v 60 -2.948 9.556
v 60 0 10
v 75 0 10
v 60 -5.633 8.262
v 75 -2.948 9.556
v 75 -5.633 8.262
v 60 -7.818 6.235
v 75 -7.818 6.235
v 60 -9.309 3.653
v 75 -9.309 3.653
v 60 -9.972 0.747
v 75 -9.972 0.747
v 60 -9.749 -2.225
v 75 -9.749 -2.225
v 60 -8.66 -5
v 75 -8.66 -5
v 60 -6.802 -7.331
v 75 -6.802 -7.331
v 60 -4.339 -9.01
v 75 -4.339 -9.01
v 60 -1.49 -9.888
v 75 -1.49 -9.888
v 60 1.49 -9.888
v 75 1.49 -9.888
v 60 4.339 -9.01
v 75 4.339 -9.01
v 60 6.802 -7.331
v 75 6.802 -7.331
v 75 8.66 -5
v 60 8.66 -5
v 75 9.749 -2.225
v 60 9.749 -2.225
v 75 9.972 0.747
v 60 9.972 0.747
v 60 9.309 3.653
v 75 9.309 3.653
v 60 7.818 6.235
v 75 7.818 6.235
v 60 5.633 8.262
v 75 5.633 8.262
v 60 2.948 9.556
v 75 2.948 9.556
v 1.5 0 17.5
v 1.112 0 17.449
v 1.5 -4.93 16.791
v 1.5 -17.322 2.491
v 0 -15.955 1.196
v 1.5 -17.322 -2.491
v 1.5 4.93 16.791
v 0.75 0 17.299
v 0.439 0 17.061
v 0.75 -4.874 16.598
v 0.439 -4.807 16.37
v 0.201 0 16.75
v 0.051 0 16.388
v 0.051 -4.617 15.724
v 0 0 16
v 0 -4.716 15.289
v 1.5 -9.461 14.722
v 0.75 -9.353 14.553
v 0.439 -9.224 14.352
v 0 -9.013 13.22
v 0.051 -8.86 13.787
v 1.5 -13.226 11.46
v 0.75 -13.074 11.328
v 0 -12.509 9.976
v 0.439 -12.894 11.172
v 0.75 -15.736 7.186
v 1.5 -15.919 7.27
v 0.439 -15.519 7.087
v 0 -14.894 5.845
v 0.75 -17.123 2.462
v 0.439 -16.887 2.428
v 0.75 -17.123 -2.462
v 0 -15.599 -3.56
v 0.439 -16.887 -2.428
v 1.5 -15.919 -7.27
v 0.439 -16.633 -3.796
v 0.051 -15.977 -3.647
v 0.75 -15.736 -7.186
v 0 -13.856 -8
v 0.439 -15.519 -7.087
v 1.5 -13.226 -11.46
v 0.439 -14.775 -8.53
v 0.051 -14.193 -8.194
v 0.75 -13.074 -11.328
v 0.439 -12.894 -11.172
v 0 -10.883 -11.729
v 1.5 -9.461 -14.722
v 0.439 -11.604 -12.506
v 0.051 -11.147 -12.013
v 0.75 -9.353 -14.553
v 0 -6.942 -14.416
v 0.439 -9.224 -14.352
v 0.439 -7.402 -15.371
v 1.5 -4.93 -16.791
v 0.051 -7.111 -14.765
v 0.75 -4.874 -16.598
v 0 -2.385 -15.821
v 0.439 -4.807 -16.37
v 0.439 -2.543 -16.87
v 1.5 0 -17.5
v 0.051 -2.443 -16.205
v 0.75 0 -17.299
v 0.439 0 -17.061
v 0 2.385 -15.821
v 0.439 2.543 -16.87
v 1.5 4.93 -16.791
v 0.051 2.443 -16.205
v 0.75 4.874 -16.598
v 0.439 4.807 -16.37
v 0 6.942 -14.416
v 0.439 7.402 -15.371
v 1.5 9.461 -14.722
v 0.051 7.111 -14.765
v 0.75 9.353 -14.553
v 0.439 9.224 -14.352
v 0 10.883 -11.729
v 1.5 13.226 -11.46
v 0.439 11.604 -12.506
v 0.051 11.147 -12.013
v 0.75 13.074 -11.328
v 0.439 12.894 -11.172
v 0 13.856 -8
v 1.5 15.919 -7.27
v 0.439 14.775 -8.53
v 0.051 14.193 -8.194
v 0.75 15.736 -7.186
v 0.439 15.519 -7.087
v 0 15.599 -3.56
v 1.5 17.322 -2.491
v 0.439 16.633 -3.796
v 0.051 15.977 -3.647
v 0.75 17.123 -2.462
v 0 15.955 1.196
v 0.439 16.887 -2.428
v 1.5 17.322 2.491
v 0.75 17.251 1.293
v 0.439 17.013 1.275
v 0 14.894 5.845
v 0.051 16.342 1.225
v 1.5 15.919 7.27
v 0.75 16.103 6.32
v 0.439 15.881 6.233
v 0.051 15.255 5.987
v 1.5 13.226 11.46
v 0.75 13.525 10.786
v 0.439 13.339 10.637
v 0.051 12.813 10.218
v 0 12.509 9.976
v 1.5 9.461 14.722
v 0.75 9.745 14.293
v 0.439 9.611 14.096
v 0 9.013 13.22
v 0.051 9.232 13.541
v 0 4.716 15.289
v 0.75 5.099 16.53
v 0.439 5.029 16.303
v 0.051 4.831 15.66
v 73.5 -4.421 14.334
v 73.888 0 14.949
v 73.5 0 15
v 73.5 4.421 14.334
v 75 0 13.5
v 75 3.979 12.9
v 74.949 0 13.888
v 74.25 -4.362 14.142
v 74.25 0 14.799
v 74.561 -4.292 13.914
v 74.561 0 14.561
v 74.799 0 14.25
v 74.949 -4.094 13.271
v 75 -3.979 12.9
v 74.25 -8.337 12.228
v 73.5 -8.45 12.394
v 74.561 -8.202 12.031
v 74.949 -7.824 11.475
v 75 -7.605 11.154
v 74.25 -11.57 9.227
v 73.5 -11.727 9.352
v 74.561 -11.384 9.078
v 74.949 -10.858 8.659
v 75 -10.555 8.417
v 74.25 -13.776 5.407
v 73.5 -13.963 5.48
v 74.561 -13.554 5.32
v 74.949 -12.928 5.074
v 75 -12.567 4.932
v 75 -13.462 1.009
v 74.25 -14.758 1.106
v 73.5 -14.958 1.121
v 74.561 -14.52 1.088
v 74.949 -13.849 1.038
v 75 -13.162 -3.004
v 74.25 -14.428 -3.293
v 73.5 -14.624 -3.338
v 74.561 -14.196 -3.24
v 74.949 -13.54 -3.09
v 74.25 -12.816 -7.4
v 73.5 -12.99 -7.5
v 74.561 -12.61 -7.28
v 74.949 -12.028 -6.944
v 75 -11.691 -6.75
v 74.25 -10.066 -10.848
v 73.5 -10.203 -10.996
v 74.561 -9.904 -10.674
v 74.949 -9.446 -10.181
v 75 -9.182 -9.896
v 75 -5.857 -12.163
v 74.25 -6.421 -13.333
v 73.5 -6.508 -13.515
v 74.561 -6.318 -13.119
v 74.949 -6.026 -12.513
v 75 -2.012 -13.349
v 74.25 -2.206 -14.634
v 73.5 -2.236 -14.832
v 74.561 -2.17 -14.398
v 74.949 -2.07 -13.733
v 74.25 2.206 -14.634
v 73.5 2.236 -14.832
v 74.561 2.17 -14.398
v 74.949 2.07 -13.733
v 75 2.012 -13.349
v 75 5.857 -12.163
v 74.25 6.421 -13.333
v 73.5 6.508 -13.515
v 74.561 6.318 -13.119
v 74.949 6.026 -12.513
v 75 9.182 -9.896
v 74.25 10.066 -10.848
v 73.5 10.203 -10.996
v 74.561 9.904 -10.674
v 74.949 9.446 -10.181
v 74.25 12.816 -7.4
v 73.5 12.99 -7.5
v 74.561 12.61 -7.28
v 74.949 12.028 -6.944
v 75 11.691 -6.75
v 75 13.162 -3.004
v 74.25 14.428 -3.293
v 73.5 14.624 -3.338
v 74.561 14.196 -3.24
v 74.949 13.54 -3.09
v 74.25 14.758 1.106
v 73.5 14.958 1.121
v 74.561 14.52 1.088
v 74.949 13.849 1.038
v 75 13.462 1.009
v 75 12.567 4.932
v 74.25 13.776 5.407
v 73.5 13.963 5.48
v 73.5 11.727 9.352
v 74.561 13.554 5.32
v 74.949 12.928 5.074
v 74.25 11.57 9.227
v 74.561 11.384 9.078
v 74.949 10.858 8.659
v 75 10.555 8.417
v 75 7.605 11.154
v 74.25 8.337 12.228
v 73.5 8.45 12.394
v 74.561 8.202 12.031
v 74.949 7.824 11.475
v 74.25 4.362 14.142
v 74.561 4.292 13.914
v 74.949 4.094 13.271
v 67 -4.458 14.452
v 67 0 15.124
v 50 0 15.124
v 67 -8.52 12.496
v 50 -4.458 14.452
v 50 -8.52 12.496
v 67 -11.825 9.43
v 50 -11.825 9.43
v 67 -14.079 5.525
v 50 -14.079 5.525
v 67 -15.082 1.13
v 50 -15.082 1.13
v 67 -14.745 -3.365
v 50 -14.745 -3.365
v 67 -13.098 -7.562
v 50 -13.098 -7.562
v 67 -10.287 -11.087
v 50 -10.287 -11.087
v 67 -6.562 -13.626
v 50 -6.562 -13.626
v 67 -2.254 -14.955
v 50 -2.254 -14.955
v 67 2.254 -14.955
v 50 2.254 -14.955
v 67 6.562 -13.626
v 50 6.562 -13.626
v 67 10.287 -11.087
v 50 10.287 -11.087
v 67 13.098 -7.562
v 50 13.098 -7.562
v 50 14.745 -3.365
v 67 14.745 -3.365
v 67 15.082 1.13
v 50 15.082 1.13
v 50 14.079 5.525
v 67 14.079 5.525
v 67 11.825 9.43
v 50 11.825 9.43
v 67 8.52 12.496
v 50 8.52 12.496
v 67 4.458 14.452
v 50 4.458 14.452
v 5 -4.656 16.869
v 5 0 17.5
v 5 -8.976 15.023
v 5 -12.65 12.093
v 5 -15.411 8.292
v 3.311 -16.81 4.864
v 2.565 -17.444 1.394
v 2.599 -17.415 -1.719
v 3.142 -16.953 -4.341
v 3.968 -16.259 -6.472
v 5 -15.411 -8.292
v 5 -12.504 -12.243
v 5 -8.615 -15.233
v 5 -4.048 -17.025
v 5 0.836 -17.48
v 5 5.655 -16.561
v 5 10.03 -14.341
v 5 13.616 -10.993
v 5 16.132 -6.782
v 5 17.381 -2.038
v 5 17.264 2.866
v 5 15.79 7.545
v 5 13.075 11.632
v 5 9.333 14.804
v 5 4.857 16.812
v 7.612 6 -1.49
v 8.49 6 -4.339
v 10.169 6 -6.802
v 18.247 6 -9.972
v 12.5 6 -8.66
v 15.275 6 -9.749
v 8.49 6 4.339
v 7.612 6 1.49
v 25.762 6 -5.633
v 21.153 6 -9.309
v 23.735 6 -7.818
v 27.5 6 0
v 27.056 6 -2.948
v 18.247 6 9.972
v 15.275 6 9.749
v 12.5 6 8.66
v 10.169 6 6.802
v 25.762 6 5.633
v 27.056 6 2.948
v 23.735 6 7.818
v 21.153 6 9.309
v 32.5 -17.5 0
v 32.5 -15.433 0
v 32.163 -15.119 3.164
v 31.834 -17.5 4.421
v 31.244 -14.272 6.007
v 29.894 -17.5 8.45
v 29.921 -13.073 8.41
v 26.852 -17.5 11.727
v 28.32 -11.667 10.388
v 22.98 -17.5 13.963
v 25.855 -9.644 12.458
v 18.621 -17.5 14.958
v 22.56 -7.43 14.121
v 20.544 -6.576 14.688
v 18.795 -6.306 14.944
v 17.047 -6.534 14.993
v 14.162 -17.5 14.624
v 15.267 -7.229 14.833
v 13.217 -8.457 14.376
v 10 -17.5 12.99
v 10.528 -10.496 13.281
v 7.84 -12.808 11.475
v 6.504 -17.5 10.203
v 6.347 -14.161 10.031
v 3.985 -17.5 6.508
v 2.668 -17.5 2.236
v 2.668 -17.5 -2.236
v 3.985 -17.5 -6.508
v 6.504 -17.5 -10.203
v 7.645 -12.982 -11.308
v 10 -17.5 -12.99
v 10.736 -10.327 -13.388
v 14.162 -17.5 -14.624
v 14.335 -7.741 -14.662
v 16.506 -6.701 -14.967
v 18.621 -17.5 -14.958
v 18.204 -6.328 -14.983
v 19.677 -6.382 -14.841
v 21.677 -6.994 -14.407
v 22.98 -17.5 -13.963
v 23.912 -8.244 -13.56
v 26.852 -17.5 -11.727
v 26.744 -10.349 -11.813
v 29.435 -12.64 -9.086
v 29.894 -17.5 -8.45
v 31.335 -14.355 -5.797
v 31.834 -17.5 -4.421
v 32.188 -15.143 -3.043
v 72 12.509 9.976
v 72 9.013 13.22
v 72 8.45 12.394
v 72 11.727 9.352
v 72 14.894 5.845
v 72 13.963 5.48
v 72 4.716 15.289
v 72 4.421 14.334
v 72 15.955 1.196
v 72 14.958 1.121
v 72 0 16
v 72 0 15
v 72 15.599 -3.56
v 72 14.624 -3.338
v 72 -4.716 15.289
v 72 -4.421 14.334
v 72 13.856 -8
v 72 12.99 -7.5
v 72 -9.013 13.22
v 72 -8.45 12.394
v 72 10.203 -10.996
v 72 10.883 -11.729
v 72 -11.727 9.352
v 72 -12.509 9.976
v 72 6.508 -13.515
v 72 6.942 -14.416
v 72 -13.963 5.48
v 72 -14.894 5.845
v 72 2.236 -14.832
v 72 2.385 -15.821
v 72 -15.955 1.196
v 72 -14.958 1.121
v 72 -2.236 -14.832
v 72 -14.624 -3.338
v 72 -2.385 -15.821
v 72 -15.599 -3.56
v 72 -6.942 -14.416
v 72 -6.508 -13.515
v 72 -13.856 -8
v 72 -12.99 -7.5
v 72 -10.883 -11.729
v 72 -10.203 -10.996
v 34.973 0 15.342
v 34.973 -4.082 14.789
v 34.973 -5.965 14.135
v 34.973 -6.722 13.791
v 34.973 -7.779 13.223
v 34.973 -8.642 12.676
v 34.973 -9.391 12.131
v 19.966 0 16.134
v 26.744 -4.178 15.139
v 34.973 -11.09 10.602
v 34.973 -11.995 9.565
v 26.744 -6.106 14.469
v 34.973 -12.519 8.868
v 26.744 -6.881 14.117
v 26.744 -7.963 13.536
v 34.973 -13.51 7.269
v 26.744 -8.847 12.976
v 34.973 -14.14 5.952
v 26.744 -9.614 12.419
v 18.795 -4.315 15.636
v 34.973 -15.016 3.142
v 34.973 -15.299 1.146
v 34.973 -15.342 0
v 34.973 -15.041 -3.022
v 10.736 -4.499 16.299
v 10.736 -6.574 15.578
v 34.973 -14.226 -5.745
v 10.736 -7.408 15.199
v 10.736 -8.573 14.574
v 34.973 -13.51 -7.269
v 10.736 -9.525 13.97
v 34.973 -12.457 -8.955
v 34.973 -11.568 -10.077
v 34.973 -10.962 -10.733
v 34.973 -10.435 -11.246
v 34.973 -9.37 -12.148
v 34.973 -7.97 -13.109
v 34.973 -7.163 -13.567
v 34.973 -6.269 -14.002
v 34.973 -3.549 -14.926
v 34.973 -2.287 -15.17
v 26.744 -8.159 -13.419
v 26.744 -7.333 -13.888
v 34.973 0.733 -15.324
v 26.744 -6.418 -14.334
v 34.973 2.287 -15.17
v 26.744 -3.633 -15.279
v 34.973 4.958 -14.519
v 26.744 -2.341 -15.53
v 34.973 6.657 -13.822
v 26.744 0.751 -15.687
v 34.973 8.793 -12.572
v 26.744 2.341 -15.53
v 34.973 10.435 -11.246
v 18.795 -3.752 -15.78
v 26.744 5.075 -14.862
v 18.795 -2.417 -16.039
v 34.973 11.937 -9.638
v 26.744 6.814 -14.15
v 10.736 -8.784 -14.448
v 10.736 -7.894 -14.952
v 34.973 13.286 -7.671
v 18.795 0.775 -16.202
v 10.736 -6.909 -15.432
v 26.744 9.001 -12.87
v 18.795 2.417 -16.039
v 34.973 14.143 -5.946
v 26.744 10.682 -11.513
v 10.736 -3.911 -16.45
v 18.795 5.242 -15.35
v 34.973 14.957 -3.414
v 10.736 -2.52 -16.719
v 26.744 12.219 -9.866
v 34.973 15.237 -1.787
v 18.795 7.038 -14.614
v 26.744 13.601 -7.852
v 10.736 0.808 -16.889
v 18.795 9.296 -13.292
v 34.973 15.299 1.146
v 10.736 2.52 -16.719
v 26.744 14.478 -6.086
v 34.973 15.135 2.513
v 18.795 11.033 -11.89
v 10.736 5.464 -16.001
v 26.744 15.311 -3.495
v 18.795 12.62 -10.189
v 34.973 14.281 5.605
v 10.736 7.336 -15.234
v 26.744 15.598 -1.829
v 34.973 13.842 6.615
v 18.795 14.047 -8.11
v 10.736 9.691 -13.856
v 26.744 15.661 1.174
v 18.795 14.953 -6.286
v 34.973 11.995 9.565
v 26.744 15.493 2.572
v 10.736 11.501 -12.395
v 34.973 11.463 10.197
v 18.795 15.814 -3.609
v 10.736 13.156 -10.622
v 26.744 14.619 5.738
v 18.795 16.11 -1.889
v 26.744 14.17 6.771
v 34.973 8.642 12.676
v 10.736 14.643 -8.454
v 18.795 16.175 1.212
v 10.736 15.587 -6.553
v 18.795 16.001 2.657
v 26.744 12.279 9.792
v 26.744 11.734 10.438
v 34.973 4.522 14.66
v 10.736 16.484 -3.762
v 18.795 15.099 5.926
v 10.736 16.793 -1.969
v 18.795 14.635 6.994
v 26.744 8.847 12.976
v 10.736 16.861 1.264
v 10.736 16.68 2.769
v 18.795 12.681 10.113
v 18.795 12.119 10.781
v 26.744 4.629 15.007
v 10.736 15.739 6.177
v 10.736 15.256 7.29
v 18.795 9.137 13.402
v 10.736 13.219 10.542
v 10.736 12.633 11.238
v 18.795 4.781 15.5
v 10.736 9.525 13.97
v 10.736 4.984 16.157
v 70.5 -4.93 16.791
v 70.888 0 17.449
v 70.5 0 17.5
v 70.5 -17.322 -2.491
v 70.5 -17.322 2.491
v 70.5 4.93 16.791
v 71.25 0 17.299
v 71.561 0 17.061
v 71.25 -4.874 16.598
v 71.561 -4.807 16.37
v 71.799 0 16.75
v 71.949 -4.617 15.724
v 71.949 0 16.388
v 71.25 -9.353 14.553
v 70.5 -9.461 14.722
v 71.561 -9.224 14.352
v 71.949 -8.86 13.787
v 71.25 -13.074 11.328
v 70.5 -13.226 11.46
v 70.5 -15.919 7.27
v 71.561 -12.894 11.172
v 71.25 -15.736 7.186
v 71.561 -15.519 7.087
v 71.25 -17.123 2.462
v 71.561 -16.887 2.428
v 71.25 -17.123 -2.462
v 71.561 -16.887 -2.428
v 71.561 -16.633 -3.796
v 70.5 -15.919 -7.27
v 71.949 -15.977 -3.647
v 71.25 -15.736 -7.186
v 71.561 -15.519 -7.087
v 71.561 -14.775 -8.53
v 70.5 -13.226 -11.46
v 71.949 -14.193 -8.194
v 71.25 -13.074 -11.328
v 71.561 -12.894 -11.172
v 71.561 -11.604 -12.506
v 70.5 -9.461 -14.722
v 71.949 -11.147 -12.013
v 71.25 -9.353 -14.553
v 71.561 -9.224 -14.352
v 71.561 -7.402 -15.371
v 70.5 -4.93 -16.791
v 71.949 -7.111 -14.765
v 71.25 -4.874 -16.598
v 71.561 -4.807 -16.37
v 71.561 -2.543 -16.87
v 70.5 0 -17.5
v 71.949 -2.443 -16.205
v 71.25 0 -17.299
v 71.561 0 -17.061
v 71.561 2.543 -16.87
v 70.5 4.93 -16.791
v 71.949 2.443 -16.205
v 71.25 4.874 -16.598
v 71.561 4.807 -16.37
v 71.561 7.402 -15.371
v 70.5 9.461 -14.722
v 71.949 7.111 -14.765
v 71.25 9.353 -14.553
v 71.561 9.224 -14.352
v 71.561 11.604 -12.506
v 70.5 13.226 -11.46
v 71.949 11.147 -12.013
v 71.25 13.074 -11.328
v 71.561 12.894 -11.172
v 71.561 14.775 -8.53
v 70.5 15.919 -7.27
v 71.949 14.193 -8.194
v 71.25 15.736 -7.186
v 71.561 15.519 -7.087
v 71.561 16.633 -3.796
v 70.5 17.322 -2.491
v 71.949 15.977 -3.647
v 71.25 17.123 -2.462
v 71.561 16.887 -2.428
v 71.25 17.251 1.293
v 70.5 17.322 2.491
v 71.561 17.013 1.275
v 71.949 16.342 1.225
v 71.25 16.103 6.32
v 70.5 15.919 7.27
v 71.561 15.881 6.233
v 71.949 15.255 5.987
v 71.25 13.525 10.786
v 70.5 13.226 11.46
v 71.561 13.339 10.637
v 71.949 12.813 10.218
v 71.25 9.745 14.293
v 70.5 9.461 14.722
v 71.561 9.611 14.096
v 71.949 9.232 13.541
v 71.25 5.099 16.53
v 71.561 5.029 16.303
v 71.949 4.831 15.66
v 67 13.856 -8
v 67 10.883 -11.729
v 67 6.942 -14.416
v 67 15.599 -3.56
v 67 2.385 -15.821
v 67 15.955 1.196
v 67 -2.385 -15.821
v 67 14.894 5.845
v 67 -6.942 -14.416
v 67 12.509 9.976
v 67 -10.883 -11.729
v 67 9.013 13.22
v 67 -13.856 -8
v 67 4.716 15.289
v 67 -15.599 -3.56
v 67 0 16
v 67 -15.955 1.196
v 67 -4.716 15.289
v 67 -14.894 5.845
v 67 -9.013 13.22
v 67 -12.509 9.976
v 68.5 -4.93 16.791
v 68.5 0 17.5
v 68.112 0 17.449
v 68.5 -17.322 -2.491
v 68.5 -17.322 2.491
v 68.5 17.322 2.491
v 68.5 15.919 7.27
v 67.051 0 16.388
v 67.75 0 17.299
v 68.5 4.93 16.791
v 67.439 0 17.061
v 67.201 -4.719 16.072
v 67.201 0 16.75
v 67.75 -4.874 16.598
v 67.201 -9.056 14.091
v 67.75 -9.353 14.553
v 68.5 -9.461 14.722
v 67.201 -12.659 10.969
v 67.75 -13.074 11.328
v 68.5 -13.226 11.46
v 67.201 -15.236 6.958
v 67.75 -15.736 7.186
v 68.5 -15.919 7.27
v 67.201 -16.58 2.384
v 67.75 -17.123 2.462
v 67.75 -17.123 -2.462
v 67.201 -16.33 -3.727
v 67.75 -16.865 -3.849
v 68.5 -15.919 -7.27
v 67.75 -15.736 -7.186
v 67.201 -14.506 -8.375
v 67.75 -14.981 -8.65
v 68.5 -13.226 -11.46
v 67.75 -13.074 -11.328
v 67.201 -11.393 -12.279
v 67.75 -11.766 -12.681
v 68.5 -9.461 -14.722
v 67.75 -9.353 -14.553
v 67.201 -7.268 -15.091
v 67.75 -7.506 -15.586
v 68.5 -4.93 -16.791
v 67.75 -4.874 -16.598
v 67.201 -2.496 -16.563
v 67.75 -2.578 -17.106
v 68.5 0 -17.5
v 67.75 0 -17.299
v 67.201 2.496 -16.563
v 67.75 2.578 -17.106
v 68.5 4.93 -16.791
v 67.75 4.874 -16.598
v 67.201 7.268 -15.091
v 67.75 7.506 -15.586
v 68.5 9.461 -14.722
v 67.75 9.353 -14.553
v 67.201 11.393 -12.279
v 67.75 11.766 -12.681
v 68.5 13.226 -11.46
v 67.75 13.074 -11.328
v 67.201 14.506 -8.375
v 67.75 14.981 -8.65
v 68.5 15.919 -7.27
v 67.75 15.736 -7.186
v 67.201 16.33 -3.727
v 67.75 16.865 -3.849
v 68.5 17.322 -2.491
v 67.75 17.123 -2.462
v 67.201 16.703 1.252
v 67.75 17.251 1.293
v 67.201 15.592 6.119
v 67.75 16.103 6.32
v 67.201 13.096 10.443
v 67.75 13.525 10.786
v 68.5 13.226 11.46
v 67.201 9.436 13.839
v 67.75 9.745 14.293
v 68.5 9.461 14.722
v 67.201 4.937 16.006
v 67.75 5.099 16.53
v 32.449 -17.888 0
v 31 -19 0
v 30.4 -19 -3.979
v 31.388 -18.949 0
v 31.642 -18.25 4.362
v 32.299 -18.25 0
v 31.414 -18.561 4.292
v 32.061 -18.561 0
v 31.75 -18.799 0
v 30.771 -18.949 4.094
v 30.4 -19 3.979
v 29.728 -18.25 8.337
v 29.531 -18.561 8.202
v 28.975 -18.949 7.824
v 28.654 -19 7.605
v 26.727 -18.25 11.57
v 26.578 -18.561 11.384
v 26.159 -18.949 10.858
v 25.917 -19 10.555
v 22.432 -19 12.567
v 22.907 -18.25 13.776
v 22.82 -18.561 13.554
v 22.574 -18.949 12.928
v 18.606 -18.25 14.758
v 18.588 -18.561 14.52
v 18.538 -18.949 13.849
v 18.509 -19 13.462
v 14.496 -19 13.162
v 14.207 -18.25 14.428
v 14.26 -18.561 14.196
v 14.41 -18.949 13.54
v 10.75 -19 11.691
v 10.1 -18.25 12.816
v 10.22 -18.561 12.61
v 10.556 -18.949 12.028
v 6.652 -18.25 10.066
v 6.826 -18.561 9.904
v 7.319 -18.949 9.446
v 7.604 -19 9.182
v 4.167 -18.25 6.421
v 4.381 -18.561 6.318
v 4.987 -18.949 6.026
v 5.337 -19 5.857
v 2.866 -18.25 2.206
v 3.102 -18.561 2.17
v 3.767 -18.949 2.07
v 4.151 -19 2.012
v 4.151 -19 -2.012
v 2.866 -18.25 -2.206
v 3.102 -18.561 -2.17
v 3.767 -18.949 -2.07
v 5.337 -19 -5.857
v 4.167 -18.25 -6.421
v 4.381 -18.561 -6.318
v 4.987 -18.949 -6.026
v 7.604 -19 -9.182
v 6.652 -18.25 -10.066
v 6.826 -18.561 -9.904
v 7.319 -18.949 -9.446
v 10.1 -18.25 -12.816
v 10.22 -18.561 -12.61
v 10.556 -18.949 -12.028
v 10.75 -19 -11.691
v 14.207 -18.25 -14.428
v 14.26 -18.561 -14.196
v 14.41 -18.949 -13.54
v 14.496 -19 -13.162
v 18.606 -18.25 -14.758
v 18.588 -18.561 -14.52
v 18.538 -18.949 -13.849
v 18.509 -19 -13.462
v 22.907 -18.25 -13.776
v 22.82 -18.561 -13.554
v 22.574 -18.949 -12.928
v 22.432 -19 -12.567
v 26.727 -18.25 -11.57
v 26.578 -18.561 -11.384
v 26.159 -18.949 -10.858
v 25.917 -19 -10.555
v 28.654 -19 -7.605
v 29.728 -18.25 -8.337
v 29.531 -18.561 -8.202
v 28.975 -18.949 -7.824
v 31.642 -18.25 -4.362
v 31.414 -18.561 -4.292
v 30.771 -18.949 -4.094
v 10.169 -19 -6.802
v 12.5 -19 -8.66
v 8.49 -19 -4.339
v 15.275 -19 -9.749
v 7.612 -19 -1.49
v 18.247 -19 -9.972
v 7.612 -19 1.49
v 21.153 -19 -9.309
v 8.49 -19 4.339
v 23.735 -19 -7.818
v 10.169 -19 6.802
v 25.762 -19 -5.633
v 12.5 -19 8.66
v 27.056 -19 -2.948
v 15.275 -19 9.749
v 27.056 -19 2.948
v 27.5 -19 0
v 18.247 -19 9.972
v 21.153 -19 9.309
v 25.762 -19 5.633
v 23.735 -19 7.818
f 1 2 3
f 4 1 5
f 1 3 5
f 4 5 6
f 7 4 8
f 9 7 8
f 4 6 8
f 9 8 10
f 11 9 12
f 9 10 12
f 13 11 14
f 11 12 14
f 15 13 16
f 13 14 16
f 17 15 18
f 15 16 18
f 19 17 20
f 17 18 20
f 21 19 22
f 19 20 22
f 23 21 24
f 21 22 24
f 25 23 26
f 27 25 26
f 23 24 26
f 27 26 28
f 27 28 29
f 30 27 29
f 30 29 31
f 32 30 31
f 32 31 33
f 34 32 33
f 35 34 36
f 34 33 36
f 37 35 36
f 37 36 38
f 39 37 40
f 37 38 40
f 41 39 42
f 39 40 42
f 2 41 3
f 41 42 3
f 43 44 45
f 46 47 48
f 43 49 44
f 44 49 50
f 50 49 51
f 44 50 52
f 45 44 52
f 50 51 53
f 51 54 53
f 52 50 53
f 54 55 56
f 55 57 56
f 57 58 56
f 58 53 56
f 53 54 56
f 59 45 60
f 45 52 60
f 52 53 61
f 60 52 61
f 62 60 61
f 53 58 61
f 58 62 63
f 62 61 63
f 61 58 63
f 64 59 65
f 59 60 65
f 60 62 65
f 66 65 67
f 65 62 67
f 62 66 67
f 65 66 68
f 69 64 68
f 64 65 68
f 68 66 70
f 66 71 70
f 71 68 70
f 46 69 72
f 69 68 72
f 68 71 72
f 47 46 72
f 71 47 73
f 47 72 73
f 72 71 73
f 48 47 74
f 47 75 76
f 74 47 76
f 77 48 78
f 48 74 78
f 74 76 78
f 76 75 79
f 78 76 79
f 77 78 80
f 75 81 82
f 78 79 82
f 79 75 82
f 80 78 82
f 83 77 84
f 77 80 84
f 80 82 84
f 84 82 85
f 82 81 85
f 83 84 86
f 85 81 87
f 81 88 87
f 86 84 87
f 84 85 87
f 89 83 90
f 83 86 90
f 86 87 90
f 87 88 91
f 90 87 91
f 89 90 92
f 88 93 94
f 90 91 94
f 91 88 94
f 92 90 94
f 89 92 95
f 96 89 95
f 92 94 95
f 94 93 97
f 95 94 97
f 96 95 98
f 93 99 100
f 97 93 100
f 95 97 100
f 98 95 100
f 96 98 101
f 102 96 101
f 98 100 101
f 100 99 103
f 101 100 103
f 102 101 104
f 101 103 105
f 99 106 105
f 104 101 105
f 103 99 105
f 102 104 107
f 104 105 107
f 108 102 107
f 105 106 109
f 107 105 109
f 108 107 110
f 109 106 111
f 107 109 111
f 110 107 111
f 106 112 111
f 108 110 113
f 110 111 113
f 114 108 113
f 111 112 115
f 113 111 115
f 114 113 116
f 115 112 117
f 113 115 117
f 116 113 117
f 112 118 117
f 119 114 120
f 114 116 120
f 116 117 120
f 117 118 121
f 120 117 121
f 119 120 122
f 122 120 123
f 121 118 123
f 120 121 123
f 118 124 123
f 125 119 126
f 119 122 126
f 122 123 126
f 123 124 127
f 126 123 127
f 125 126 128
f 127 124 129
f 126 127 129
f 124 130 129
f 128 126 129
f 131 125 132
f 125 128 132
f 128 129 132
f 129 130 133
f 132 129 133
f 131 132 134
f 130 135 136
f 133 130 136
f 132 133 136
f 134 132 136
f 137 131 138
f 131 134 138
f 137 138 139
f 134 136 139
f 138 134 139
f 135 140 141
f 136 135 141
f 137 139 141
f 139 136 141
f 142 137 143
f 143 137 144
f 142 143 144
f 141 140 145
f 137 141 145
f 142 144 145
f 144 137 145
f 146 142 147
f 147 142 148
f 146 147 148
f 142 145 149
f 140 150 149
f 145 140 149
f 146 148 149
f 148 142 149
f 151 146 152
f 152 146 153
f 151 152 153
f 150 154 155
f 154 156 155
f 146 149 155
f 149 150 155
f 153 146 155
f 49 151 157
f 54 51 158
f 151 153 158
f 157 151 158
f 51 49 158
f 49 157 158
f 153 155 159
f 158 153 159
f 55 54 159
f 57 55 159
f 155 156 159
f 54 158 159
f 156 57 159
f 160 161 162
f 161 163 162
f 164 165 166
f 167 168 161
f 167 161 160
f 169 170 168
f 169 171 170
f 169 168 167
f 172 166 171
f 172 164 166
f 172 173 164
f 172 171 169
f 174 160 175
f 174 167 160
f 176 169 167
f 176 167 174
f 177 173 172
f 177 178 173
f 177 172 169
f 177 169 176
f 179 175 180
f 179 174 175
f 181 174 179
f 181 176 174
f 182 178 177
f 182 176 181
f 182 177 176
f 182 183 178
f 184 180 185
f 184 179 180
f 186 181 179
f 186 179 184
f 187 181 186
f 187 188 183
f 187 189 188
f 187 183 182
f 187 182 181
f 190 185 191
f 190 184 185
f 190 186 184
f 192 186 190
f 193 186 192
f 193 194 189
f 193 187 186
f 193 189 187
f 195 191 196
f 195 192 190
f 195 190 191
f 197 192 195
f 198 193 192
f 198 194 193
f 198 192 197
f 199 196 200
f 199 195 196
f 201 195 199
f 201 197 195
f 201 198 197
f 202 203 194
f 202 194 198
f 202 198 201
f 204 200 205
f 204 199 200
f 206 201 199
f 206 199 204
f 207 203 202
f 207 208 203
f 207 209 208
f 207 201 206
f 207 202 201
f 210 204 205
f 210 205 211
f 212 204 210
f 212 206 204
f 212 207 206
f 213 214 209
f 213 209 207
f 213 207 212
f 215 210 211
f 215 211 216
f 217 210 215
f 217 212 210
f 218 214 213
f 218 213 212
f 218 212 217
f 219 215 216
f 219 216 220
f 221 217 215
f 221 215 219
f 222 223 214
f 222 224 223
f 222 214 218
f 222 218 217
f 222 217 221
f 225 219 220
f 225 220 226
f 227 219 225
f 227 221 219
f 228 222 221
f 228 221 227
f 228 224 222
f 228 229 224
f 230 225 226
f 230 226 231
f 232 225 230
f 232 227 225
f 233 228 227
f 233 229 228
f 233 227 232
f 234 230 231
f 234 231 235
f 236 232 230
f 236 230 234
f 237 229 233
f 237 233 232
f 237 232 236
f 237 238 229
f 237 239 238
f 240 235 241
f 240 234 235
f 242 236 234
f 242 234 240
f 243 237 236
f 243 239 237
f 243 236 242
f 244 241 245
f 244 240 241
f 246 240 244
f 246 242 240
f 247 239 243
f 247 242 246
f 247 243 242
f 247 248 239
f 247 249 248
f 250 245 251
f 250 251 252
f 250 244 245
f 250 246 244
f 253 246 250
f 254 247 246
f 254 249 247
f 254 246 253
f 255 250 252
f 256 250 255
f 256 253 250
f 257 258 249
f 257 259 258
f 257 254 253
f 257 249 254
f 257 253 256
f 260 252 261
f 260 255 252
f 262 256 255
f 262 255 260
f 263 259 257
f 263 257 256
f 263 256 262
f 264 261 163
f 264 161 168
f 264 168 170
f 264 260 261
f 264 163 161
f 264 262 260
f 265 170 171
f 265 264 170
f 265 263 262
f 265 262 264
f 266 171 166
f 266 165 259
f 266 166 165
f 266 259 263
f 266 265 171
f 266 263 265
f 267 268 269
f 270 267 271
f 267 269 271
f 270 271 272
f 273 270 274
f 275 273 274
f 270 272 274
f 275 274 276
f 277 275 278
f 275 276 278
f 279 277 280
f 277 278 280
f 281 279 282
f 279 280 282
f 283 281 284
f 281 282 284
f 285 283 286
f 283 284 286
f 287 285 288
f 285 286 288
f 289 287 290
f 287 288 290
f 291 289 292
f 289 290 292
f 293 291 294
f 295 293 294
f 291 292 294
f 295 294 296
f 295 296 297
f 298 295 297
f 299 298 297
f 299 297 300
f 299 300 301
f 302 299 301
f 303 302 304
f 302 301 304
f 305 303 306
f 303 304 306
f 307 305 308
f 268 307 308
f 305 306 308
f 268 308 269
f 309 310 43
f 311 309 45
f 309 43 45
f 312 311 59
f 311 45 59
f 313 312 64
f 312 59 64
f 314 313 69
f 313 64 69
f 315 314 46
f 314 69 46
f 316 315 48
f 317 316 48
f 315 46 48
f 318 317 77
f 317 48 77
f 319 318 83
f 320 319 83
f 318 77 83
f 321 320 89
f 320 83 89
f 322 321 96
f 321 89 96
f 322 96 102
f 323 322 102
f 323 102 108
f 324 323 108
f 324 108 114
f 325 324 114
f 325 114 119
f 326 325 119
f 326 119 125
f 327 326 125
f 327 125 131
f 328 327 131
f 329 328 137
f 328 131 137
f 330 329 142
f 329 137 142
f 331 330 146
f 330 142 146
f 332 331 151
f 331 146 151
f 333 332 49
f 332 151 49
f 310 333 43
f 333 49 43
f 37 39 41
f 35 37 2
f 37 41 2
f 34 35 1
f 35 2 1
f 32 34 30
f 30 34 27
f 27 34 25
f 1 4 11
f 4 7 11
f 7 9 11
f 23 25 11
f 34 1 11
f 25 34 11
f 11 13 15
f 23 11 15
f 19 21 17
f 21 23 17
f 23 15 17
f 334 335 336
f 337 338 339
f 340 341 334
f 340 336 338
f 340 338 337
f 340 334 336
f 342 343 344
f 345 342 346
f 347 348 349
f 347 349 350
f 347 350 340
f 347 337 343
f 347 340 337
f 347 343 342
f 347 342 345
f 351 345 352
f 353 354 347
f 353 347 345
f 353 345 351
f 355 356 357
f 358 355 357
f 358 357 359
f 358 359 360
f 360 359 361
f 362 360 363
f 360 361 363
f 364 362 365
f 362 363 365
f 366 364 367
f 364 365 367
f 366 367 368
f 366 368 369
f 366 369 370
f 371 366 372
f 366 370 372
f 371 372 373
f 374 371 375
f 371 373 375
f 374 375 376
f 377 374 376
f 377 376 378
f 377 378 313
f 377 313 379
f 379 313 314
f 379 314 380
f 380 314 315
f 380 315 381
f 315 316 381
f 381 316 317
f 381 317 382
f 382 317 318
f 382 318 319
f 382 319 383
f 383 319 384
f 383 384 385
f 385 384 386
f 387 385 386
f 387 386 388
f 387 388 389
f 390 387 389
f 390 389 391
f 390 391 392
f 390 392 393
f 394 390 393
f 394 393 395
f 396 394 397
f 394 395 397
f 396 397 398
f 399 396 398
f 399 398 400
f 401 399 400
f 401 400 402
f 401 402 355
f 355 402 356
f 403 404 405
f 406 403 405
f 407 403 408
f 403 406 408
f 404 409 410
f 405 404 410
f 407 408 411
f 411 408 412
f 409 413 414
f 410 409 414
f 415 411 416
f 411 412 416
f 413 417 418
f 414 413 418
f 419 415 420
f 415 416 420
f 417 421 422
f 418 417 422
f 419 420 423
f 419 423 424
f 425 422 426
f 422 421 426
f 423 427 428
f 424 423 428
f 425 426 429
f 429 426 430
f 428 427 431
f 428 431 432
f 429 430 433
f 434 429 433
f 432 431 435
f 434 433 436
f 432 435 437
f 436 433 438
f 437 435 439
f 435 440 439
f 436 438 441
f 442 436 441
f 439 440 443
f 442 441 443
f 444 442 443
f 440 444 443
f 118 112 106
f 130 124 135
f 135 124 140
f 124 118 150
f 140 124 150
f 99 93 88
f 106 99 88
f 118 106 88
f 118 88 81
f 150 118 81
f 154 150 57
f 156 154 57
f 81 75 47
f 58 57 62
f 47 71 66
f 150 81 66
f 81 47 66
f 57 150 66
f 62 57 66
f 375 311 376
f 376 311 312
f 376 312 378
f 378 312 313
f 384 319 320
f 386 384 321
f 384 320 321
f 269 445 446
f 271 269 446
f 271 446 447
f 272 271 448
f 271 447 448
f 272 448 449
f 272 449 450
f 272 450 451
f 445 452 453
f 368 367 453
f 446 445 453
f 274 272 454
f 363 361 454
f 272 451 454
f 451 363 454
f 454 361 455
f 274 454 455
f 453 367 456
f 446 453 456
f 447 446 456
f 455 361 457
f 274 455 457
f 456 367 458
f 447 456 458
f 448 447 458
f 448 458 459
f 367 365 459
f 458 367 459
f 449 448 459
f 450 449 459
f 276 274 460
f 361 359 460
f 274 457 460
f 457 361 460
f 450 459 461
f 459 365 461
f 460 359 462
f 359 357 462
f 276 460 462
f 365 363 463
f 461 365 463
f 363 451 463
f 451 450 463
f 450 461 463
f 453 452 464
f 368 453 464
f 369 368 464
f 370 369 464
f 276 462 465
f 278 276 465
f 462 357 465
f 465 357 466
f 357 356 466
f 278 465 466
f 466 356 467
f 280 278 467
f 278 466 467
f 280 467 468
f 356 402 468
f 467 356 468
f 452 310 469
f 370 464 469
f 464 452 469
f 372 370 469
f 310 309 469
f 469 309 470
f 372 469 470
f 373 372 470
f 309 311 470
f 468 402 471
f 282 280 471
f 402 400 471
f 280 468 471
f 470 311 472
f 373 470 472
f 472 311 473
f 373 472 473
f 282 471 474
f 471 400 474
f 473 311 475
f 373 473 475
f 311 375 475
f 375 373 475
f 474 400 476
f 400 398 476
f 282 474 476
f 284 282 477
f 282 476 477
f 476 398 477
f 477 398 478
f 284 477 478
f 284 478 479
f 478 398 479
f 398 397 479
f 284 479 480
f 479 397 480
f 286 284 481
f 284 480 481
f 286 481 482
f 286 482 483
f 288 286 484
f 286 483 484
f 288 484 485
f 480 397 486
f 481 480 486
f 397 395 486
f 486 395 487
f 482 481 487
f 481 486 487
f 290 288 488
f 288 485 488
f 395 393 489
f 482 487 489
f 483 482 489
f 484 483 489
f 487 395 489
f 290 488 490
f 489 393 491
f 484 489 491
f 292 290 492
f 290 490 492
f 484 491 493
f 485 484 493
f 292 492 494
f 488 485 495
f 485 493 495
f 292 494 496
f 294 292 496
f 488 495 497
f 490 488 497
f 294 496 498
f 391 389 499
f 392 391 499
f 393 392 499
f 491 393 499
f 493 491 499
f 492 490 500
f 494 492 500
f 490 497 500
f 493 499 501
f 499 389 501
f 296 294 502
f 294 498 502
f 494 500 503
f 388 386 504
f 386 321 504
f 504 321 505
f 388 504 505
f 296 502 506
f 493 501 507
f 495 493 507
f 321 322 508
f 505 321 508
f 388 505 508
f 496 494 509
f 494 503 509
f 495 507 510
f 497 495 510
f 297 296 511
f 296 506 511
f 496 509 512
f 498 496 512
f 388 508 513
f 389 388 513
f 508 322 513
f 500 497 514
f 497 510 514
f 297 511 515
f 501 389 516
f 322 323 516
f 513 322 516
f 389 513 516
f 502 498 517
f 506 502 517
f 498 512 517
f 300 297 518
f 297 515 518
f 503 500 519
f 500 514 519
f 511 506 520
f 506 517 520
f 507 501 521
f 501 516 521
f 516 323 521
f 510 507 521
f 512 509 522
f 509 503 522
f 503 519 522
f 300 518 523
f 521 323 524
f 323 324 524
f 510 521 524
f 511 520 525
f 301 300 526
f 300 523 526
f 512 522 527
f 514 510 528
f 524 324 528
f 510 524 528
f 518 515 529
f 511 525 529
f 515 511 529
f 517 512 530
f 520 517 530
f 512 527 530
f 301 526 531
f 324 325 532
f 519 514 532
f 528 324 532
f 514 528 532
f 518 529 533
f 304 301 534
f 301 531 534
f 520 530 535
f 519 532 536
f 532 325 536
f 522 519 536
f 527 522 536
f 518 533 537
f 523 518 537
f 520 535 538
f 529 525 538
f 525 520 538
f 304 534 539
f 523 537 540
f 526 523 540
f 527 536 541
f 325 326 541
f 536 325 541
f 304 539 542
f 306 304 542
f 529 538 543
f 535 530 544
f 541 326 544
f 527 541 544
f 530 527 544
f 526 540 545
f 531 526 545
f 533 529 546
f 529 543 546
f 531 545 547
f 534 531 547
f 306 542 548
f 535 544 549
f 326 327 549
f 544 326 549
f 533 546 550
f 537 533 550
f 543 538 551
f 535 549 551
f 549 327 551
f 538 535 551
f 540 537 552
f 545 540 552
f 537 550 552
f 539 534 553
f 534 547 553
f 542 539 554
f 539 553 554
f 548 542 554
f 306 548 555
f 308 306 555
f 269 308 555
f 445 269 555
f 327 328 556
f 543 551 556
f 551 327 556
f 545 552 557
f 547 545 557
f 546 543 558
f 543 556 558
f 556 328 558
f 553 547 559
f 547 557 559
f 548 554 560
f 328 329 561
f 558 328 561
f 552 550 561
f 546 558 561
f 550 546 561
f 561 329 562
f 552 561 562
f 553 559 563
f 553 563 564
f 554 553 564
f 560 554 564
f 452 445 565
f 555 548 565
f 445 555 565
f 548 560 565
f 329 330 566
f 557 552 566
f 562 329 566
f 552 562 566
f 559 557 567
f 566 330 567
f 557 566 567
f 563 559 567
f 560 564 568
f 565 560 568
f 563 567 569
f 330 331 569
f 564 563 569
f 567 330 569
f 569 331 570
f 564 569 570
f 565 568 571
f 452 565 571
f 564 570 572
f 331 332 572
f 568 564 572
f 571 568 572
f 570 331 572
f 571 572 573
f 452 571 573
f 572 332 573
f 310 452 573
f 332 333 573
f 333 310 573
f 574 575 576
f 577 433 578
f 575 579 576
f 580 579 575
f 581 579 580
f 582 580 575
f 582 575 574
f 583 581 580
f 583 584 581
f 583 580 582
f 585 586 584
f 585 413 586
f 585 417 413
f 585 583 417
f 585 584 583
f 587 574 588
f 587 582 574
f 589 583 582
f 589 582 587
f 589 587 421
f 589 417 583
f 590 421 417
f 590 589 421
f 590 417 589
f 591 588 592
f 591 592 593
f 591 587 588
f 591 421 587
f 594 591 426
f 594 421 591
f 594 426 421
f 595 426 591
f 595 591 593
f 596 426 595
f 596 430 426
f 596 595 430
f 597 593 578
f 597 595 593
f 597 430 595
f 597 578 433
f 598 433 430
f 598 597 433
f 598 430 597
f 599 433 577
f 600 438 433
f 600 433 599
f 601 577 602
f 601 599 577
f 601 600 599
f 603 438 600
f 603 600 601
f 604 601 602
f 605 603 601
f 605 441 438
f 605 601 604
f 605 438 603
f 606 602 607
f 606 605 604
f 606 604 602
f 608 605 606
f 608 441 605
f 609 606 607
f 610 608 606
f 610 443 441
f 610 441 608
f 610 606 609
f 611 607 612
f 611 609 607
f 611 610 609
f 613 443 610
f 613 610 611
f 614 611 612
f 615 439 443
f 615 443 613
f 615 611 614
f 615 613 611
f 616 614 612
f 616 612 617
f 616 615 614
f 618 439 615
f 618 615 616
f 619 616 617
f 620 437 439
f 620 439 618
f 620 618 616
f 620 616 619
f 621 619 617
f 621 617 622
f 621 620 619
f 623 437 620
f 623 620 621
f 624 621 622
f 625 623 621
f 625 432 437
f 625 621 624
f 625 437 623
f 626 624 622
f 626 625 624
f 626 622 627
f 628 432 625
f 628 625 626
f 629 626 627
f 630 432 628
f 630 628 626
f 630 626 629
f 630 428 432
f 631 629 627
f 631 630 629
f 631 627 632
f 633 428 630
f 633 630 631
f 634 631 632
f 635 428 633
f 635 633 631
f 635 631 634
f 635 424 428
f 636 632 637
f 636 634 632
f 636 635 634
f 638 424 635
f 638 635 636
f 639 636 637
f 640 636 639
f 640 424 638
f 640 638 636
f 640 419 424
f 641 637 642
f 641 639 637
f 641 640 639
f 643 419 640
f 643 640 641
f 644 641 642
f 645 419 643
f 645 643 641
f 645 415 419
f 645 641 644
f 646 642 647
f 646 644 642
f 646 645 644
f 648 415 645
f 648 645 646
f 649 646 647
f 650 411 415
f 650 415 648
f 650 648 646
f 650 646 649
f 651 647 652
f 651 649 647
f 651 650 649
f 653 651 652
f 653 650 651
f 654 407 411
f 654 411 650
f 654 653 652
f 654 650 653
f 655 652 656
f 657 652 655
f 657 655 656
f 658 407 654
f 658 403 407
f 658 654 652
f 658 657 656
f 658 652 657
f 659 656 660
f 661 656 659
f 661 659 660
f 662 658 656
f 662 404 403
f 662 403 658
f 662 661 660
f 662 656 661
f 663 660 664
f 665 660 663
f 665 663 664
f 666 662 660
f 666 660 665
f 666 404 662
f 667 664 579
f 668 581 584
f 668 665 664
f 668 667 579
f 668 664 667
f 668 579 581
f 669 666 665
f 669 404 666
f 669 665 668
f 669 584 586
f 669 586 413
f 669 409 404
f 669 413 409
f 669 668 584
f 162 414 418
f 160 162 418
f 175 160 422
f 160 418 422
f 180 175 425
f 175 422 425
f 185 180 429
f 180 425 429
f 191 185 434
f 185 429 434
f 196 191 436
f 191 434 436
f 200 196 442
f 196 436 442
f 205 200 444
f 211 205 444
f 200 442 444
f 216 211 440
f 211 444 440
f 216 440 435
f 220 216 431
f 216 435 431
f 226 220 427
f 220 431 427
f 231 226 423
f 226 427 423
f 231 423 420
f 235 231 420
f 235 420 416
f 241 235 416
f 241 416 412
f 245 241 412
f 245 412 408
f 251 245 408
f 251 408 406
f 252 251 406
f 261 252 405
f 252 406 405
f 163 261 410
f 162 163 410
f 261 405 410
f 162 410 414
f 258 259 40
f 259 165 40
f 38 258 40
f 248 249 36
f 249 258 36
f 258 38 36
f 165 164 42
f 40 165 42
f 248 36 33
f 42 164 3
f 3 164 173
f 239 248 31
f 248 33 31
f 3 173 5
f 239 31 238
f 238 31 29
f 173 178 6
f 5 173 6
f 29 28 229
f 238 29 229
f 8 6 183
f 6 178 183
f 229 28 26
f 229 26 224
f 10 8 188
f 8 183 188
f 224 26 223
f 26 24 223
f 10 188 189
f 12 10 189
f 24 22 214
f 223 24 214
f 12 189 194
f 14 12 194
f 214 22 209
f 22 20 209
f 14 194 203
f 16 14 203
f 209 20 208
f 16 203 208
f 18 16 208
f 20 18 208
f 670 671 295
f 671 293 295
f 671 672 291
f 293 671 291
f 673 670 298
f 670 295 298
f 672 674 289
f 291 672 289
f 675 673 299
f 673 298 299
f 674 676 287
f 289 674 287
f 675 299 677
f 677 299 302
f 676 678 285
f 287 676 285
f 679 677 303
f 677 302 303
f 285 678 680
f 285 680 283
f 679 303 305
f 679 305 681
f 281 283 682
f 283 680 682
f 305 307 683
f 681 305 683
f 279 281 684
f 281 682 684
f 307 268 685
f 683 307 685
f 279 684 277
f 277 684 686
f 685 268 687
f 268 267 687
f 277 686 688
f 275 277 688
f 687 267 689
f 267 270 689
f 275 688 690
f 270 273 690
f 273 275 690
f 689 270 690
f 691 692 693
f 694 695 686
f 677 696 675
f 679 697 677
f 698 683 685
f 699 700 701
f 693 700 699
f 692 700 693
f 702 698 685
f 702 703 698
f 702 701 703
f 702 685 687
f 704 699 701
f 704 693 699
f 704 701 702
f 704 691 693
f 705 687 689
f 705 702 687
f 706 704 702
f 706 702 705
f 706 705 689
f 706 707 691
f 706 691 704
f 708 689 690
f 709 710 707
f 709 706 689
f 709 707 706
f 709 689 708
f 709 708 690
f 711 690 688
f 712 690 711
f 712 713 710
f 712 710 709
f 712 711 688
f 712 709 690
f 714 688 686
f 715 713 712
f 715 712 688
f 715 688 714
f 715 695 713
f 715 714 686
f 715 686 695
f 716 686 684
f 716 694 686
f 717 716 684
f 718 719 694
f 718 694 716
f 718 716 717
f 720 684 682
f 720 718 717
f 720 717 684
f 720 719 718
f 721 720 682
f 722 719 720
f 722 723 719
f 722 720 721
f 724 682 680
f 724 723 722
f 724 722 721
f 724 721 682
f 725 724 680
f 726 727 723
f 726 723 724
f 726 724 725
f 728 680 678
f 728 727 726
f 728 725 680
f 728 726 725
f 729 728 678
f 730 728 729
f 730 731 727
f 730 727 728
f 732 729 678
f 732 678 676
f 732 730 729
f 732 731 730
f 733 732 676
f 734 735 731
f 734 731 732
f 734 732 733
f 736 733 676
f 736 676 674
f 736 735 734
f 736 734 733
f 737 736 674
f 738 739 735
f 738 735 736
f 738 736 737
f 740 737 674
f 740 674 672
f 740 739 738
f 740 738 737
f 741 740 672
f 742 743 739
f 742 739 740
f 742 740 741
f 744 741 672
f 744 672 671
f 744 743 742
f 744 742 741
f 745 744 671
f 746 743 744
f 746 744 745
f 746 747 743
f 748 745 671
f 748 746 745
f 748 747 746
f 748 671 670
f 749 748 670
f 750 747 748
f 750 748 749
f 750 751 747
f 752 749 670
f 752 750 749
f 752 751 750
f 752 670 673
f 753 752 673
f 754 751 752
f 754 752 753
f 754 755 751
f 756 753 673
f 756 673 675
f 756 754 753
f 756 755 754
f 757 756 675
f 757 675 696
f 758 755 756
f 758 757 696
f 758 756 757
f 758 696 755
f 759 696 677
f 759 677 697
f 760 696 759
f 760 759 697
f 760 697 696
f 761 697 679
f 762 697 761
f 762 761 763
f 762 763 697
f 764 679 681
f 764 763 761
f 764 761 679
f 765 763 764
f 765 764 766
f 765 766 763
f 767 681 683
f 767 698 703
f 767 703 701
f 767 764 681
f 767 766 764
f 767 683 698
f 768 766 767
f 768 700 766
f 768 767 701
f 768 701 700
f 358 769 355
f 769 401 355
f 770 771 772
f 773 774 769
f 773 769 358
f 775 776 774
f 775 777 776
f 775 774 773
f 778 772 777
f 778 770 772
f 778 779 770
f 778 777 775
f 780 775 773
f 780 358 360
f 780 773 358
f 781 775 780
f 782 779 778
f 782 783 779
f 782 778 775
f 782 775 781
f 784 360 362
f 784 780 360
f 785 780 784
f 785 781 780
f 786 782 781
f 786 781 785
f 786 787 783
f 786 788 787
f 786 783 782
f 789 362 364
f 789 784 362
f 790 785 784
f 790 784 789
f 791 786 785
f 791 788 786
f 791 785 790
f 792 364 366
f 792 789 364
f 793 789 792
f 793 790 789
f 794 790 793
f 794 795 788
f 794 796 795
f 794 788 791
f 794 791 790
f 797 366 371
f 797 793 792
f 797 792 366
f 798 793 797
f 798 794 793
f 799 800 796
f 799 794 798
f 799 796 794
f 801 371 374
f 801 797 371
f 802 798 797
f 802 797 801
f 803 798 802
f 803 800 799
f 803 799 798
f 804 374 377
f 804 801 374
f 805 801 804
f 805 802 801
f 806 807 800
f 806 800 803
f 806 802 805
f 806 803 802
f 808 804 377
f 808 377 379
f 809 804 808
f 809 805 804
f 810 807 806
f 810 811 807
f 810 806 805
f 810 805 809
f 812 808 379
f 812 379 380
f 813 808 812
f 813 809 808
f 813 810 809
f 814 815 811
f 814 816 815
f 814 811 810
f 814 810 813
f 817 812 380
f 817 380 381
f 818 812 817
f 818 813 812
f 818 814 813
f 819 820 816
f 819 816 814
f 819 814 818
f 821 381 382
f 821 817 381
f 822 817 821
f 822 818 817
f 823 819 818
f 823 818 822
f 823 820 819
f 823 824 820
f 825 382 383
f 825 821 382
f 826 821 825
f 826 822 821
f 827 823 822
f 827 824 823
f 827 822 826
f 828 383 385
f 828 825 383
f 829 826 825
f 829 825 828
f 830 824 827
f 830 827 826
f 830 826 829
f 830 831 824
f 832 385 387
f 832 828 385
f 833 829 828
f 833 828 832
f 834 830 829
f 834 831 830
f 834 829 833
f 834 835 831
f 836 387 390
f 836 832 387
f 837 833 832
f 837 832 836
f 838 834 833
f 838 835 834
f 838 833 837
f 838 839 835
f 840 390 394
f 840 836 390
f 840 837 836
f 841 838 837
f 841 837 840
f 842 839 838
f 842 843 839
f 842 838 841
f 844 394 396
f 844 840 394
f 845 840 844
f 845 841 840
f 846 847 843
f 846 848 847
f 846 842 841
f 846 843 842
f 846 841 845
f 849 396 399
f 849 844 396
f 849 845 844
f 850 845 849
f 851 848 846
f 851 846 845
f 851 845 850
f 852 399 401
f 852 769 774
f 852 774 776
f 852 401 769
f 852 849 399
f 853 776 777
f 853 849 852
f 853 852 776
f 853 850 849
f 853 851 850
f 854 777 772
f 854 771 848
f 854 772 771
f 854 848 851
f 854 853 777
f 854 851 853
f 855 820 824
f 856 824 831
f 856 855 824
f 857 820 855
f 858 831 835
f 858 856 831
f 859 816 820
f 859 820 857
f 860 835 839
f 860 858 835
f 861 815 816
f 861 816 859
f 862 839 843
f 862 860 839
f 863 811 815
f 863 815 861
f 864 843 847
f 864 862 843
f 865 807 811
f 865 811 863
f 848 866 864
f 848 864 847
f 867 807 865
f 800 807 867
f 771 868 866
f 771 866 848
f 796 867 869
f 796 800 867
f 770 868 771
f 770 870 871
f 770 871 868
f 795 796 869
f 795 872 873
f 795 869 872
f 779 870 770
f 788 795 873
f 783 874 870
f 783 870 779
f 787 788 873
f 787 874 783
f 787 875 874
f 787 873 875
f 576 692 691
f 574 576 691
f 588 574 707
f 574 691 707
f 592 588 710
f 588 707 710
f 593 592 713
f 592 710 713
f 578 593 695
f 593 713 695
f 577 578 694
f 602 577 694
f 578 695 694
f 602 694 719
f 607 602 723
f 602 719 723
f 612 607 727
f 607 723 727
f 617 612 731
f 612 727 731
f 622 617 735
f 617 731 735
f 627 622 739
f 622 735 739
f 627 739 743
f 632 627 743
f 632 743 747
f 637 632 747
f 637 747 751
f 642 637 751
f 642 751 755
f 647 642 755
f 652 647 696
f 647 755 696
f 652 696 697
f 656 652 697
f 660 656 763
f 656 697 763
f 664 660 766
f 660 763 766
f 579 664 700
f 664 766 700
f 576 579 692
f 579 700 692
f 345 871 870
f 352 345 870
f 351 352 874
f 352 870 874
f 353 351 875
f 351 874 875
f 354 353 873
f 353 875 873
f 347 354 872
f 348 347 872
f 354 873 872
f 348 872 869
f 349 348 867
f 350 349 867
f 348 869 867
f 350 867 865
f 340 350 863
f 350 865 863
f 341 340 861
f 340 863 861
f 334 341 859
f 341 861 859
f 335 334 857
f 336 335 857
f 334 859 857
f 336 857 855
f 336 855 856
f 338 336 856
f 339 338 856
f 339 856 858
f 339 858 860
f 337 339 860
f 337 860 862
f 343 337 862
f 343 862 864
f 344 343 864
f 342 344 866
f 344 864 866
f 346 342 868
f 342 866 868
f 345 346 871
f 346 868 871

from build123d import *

# Parameters (mm, degrees)
F2_R     = 15
F3_DEPTH = 19
F4_R     = 10
F5_DEPTH = 25
F6_R     = 1.5


with BuildPart() as f1:
    # F0 (on Front) → F1 (revolve)
    with BuildSketch(Plane.XZ):
        with BuildLine():
            Line((0, 17.5), (0, 0))
            Line((0, 0), (60, 0))
            Line((60, 0), (60, 10))
            Line((60, 10), (75, 10))
            Line((75, 10), (75, 15))
            Line((75, 15), (72, 15))
            Line((72, 15), (72, 17.5))
            Line((72, 17.5), (67, 17.5))
            Line((67, 17.5), (67, 15.124123))
            Line((67, 15.124123), (50, 15.124123))
            ThreePointArc((50, 15.124123), (27.465898, 15.666159), (5, 17.5))
            Line((5, 17.5), (0, 17.5))
        make_face()
    revolve(axis=Axis((30, 0, 0), (1, 0, 0)))

    # F2 (on Front) → F3 (join)
    with BuildSketch(Plane.XZ):
        with Locations((17.5, 0)):
            Circle(F2_R)
    extrude(amount=F3_DEPTH)

    # F4 (on face) → F5 (cut)
    with BuildSketch(Plane.XZ.offset(19)):
        with Locations((17.5, 0)):
            Circle(F4_R)
    extrude(amount=-F5_DEPTH, mode=Mode.SUBTRACT)

    # F6
    f6_edges = [f1.edges().sort_by_distance(p)[0] for p in [
        (0, 0, -17.5),
        (2.5, -19, 0),
        (67, 0, -17.5),
        (72, 0, -17.5),
        (75, 0, -15),
    ]]
    fillet(f6_edges, radius=F6_R)


solid = f1.part
